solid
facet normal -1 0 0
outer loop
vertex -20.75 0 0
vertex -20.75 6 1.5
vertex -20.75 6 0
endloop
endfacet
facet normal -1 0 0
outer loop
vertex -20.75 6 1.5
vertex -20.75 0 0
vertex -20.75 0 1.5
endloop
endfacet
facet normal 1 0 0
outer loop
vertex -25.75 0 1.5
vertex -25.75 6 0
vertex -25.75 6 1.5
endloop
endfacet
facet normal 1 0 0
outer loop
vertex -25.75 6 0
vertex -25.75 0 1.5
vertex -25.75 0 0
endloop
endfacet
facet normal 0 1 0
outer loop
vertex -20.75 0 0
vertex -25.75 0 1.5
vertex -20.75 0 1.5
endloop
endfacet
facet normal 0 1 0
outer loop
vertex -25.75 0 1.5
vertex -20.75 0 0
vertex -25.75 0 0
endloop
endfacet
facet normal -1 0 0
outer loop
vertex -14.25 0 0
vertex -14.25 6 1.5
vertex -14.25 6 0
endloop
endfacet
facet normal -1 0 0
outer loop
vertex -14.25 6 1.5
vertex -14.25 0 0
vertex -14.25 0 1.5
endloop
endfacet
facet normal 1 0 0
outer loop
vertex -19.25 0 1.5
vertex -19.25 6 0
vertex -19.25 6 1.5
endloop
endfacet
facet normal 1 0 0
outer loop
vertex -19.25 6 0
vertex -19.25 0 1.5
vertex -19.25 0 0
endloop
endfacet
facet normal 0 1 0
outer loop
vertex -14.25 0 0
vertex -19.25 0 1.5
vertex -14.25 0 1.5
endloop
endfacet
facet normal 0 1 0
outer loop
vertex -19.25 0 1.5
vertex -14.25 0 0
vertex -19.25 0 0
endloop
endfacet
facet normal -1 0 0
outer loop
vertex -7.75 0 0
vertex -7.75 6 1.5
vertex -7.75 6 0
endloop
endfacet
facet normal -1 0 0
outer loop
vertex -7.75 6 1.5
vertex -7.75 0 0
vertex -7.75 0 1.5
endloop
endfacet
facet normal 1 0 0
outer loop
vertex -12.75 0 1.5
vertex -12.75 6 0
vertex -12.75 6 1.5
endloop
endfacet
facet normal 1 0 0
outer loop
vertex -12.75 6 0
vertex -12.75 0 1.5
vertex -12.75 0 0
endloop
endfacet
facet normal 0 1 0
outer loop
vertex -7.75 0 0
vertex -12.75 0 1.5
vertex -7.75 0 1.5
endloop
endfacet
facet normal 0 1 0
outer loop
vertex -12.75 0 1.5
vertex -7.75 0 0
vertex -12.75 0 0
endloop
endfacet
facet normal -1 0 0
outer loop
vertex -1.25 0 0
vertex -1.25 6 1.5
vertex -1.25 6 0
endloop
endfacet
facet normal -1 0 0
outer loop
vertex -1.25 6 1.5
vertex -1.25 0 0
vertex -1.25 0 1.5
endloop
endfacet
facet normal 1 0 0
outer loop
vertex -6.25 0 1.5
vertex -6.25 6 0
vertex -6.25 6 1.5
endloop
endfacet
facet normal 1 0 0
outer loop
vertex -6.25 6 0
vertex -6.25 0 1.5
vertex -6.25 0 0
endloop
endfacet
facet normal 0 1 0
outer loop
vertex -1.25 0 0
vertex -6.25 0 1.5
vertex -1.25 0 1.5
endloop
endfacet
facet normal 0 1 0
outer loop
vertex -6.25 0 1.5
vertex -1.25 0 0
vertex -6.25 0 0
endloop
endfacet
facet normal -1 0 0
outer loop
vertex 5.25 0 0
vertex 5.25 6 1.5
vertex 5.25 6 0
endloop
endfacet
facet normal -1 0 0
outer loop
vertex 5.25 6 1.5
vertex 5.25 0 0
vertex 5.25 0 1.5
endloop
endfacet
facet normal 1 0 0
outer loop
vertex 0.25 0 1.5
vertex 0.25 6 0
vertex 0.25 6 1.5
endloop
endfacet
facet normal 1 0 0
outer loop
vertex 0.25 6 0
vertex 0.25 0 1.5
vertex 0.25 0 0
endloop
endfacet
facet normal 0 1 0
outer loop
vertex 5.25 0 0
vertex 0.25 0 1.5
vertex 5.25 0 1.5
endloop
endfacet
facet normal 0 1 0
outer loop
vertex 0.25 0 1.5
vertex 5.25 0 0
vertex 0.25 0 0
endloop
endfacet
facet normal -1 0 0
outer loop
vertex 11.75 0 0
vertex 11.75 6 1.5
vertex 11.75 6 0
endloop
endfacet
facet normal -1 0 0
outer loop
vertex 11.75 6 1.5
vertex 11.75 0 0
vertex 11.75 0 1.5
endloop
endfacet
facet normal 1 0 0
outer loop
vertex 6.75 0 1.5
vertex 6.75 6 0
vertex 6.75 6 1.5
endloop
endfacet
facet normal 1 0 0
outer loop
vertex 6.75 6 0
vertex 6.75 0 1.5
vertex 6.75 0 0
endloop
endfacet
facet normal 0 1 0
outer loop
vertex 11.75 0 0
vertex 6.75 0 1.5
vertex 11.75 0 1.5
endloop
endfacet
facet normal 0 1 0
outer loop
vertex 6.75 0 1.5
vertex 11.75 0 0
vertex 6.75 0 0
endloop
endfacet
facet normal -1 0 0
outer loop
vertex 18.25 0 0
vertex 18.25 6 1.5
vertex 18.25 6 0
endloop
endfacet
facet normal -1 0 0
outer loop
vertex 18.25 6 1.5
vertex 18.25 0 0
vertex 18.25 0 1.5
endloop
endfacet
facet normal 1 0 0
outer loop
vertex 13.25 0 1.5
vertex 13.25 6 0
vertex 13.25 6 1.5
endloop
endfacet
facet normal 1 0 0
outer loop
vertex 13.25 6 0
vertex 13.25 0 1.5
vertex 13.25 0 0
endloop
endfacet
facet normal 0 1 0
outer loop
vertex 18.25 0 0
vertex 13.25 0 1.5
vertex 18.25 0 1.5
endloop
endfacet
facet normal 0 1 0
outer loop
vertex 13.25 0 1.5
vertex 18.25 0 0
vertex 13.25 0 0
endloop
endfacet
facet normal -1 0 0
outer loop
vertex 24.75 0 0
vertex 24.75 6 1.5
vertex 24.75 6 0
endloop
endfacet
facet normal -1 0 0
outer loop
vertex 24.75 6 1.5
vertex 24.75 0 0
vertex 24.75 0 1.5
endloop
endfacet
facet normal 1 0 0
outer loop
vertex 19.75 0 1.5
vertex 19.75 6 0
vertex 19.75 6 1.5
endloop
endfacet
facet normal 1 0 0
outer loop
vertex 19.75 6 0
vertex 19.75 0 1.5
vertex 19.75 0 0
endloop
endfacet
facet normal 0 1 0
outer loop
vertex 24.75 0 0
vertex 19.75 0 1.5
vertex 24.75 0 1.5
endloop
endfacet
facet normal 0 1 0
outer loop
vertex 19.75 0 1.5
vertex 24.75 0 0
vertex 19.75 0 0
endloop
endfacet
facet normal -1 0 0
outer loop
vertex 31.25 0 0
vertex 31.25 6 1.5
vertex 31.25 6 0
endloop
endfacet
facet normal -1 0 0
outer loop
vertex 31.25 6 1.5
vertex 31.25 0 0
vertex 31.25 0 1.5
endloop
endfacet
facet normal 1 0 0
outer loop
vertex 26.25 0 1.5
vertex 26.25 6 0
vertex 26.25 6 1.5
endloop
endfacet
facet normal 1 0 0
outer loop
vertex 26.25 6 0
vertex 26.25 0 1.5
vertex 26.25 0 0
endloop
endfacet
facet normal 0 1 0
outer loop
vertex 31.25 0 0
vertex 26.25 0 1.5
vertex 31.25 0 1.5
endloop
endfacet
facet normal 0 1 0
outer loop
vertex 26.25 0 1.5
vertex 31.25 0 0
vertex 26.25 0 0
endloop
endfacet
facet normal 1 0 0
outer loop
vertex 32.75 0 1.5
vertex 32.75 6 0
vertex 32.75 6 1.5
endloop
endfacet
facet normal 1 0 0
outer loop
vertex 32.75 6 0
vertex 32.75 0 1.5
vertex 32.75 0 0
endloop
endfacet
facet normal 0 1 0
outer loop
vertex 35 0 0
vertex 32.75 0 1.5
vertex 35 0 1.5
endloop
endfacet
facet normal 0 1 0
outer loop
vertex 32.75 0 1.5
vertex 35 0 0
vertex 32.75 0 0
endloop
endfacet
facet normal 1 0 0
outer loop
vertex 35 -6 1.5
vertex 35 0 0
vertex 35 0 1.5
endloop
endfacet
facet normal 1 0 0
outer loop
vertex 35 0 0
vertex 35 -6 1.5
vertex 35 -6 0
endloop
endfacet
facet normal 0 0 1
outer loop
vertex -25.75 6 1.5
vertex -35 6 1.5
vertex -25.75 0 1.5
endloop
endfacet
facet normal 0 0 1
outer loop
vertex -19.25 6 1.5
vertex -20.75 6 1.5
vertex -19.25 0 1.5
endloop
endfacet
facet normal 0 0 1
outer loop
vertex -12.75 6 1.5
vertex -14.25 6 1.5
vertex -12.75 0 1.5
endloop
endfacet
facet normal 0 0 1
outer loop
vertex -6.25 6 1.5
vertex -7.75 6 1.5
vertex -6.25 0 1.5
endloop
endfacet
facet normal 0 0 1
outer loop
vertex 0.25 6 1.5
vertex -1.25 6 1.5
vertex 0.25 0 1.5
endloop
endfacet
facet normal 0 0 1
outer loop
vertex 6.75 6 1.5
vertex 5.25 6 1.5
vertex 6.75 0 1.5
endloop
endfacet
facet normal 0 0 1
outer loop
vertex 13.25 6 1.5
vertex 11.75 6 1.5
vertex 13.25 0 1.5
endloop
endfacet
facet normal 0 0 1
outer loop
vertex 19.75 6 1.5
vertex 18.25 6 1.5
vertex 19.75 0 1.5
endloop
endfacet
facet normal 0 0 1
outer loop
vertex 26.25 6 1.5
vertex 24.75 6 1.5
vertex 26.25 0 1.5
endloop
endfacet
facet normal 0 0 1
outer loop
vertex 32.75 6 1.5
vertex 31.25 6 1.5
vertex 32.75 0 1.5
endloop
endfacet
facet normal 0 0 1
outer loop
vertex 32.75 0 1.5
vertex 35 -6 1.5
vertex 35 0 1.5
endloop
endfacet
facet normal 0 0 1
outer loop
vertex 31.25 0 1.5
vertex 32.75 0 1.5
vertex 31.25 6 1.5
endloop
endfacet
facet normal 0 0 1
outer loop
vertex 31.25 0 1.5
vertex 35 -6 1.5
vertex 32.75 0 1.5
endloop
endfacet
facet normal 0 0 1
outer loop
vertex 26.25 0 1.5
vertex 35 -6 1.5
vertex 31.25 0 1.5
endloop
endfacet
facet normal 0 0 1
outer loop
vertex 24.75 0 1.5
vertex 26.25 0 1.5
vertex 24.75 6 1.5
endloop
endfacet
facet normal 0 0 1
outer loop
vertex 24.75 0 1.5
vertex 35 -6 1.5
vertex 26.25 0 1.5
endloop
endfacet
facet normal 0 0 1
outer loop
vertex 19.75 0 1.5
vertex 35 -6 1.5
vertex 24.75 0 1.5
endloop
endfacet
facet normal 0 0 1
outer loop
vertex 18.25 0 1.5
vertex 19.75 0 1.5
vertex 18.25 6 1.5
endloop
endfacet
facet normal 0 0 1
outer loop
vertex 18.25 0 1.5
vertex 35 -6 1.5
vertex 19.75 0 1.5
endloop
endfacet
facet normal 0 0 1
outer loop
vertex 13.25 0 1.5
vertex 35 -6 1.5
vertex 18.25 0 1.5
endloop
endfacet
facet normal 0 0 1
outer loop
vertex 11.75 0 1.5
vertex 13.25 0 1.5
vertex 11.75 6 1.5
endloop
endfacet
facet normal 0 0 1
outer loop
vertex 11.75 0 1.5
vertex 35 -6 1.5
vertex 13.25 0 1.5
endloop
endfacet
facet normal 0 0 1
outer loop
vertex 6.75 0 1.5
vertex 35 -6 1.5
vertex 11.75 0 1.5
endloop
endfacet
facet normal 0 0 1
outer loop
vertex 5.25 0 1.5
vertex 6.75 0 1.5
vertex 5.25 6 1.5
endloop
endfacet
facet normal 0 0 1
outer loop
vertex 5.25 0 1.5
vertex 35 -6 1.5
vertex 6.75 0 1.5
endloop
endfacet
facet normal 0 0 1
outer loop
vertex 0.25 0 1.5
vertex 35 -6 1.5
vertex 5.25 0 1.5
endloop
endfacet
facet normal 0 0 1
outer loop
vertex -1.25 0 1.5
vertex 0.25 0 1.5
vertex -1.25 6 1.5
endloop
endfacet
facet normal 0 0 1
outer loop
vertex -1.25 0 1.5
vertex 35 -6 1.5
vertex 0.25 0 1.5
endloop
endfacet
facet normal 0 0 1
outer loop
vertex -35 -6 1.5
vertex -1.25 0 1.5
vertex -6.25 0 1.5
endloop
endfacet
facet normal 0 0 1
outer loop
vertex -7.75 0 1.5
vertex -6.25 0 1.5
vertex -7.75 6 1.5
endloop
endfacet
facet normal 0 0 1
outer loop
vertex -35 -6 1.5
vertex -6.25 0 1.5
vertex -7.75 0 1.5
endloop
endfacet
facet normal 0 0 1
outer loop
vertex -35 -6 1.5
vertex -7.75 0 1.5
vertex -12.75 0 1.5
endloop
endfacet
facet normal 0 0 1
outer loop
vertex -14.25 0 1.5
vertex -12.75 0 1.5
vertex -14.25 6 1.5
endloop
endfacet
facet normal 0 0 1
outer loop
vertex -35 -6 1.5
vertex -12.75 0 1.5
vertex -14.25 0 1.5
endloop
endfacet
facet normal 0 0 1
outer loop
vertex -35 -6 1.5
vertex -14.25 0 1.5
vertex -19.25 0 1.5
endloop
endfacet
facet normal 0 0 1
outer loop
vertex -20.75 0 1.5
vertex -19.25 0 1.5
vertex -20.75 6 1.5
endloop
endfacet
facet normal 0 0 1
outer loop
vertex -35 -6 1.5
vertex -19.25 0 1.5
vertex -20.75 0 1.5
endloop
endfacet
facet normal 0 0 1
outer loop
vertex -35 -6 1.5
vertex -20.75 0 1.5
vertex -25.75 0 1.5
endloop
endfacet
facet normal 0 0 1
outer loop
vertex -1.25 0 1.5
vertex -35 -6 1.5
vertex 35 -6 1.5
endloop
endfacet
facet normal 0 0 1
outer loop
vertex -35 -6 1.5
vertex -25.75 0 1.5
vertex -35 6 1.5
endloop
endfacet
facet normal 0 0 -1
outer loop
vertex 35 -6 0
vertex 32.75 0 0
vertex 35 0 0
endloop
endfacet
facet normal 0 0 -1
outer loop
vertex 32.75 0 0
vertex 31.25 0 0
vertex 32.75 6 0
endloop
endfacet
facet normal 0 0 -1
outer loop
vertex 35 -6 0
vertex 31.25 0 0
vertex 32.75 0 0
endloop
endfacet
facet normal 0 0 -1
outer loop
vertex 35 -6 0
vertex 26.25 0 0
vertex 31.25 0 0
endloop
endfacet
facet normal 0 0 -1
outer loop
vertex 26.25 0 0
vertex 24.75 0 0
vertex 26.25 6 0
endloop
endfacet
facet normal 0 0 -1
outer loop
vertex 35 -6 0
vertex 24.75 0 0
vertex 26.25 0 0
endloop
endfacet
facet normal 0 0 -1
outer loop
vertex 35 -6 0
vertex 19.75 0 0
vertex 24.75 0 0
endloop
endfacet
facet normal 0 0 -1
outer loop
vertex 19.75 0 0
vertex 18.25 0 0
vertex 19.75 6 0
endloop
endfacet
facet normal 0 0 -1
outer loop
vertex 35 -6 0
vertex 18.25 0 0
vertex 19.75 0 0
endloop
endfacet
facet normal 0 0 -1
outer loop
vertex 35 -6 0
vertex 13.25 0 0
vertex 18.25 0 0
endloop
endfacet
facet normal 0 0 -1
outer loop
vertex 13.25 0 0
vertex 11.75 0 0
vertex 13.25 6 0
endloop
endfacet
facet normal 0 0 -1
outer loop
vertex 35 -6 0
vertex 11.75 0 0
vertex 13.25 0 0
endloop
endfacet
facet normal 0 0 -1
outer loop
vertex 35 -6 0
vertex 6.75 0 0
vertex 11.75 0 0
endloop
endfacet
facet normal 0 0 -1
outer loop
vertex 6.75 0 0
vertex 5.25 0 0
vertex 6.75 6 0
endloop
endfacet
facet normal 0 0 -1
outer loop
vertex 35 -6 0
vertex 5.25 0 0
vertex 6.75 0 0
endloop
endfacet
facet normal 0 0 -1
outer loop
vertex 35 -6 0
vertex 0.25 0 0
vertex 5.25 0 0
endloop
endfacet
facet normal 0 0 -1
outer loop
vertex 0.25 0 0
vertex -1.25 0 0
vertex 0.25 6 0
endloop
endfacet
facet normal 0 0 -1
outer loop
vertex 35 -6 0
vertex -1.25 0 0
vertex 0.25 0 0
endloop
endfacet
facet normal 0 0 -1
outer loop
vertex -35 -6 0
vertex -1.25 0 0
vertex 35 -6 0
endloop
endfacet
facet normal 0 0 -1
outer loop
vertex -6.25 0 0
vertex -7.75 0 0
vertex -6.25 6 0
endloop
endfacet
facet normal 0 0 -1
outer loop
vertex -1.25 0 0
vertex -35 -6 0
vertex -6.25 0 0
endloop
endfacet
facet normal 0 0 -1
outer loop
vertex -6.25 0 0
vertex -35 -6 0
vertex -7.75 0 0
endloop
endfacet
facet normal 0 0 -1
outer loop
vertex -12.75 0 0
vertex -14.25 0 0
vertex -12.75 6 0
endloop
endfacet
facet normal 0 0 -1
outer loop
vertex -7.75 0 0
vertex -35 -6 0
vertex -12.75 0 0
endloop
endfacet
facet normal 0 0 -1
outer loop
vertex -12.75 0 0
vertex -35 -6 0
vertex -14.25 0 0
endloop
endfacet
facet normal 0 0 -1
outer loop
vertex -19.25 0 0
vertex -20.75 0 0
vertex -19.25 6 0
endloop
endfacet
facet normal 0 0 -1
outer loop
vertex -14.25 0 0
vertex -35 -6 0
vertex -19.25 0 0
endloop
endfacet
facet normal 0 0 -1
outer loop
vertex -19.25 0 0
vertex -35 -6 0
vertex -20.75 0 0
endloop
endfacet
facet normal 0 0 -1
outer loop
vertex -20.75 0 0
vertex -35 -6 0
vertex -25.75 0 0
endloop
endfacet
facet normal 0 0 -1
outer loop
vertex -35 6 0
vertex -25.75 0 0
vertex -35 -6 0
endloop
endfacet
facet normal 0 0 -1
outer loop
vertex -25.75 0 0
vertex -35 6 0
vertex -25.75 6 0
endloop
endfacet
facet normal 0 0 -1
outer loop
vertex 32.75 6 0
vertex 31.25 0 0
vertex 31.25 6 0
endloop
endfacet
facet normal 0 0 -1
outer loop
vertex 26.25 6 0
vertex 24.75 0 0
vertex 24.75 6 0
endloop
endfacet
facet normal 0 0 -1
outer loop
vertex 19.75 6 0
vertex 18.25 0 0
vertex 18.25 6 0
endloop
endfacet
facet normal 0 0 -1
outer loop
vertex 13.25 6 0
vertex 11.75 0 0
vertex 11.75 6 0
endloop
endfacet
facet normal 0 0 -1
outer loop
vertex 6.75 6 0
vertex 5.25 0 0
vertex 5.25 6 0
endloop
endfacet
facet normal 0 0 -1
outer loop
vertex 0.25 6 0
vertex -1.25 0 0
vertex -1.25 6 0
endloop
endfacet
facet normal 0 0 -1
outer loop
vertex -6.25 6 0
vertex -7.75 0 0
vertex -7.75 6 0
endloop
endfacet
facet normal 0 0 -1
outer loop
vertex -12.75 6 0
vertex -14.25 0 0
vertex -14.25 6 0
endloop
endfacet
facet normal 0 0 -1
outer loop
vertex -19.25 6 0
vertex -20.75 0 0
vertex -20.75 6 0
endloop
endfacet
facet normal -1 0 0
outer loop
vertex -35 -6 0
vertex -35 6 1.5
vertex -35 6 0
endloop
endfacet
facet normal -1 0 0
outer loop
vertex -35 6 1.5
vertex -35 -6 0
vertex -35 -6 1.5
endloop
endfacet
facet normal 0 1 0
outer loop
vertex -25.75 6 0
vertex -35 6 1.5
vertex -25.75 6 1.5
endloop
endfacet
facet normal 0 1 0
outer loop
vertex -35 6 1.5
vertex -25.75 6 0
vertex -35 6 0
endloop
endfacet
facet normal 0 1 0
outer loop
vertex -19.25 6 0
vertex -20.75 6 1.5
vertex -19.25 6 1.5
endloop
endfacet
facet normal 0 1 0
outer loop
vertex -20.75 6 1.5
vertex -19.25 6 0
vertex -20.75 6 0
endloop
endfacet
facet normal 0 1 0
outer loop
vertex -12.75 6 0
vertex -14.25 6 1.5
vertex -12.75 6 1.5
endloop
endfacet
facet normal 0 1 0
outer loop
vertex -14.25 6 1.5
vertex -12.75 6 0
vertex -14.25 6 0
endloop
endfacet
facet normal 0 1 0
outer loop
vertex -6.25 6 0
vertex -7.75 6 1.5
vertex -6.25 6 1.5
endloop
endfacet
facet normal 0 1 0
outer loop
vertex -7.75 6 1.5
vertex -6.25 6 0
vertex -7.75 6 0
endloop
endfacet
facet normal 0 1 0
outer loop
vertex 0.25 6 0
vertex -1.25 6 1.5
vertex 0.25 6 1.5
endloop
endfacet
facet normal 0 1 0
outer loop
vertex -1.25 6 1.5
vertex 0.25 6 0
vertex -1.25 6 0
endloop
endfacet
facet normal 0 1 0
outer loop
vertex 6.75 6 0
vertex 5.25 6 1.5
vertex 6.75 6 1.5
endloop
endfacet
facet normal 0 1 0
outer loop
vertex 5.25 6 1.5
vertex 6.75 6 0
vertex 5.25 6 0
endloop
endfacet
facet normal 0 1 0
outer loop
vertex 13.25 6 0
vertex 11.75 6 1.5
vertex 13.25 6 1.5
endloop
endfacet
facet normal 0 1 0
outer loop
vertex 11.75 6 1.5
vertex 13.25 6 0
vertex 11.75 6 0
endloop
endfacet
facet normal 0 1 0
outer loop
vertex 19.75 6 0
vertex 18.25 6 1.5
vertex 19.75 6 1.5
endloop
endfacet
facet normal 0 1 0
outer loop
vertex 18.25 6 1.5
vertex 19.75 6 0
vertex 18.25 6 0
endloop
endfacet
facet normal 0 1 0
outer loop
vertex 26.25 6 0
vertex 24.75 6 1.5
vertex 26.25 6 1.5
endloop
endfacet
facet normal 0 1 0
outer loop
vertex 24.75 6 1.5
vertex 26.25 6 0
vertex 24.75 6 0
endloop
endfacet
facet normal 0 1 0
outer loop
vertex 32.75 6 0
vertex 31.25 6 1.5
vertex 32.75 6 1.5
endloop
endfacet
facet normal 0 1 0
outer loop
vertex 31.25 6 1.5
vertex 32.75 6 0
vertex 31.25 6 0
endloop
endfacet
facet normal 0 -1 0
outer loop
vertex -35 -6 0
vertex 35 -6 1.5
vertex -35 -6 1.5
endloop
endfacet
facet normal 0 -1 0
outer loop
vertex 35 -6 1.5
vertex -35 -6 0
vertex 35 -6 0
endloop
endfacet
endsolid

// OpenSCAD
// 10-well comb for agarose gel casting
// Print orientation: flat on bed, teeth pointing down (-Z)

// ---------- Parameters ----------
plate_len    = 70;    // spine length (X)
plate_wid    = 12;    // spine width (Y)
plate_thk    = 1.5;   // plate thickness (Z)

tooth_count  = 10;    // number of wells
tooth_w      = 5.0;   // tooth width (X)
tooth_len    = 12;    // tooth length from spine (Y)
tooth_gap    = 1.5;   // gap between neighbouring teeth (X)

eps          = 0.5;   // cutter overshoot past faces

$fn = 64;

// ---------- Derived ----------
row_len = (tooth_count - 1) * tooth_gap;  // span of gaps
x0 = -(plate_len / 2 - tooth_w / 2 - row_len / 2);  // first tooth centre

// ---------- Model ----------
difference() {
    // Base plate
    translate([-plate_len / 2, -plate_wid / 2, 0])
        cube([plate_len, plate_wid, plate_thk]);

    // Teeth (through-cut, extend below z = 0)
    for (i = [0 : tooth_count - 1])
        translate([x0 + i * (tooth_w + tooth_gap), 0, -eps])
            cube([tooth_w, tooth_len + eps, plate_thk + 2 * eps]);
}
